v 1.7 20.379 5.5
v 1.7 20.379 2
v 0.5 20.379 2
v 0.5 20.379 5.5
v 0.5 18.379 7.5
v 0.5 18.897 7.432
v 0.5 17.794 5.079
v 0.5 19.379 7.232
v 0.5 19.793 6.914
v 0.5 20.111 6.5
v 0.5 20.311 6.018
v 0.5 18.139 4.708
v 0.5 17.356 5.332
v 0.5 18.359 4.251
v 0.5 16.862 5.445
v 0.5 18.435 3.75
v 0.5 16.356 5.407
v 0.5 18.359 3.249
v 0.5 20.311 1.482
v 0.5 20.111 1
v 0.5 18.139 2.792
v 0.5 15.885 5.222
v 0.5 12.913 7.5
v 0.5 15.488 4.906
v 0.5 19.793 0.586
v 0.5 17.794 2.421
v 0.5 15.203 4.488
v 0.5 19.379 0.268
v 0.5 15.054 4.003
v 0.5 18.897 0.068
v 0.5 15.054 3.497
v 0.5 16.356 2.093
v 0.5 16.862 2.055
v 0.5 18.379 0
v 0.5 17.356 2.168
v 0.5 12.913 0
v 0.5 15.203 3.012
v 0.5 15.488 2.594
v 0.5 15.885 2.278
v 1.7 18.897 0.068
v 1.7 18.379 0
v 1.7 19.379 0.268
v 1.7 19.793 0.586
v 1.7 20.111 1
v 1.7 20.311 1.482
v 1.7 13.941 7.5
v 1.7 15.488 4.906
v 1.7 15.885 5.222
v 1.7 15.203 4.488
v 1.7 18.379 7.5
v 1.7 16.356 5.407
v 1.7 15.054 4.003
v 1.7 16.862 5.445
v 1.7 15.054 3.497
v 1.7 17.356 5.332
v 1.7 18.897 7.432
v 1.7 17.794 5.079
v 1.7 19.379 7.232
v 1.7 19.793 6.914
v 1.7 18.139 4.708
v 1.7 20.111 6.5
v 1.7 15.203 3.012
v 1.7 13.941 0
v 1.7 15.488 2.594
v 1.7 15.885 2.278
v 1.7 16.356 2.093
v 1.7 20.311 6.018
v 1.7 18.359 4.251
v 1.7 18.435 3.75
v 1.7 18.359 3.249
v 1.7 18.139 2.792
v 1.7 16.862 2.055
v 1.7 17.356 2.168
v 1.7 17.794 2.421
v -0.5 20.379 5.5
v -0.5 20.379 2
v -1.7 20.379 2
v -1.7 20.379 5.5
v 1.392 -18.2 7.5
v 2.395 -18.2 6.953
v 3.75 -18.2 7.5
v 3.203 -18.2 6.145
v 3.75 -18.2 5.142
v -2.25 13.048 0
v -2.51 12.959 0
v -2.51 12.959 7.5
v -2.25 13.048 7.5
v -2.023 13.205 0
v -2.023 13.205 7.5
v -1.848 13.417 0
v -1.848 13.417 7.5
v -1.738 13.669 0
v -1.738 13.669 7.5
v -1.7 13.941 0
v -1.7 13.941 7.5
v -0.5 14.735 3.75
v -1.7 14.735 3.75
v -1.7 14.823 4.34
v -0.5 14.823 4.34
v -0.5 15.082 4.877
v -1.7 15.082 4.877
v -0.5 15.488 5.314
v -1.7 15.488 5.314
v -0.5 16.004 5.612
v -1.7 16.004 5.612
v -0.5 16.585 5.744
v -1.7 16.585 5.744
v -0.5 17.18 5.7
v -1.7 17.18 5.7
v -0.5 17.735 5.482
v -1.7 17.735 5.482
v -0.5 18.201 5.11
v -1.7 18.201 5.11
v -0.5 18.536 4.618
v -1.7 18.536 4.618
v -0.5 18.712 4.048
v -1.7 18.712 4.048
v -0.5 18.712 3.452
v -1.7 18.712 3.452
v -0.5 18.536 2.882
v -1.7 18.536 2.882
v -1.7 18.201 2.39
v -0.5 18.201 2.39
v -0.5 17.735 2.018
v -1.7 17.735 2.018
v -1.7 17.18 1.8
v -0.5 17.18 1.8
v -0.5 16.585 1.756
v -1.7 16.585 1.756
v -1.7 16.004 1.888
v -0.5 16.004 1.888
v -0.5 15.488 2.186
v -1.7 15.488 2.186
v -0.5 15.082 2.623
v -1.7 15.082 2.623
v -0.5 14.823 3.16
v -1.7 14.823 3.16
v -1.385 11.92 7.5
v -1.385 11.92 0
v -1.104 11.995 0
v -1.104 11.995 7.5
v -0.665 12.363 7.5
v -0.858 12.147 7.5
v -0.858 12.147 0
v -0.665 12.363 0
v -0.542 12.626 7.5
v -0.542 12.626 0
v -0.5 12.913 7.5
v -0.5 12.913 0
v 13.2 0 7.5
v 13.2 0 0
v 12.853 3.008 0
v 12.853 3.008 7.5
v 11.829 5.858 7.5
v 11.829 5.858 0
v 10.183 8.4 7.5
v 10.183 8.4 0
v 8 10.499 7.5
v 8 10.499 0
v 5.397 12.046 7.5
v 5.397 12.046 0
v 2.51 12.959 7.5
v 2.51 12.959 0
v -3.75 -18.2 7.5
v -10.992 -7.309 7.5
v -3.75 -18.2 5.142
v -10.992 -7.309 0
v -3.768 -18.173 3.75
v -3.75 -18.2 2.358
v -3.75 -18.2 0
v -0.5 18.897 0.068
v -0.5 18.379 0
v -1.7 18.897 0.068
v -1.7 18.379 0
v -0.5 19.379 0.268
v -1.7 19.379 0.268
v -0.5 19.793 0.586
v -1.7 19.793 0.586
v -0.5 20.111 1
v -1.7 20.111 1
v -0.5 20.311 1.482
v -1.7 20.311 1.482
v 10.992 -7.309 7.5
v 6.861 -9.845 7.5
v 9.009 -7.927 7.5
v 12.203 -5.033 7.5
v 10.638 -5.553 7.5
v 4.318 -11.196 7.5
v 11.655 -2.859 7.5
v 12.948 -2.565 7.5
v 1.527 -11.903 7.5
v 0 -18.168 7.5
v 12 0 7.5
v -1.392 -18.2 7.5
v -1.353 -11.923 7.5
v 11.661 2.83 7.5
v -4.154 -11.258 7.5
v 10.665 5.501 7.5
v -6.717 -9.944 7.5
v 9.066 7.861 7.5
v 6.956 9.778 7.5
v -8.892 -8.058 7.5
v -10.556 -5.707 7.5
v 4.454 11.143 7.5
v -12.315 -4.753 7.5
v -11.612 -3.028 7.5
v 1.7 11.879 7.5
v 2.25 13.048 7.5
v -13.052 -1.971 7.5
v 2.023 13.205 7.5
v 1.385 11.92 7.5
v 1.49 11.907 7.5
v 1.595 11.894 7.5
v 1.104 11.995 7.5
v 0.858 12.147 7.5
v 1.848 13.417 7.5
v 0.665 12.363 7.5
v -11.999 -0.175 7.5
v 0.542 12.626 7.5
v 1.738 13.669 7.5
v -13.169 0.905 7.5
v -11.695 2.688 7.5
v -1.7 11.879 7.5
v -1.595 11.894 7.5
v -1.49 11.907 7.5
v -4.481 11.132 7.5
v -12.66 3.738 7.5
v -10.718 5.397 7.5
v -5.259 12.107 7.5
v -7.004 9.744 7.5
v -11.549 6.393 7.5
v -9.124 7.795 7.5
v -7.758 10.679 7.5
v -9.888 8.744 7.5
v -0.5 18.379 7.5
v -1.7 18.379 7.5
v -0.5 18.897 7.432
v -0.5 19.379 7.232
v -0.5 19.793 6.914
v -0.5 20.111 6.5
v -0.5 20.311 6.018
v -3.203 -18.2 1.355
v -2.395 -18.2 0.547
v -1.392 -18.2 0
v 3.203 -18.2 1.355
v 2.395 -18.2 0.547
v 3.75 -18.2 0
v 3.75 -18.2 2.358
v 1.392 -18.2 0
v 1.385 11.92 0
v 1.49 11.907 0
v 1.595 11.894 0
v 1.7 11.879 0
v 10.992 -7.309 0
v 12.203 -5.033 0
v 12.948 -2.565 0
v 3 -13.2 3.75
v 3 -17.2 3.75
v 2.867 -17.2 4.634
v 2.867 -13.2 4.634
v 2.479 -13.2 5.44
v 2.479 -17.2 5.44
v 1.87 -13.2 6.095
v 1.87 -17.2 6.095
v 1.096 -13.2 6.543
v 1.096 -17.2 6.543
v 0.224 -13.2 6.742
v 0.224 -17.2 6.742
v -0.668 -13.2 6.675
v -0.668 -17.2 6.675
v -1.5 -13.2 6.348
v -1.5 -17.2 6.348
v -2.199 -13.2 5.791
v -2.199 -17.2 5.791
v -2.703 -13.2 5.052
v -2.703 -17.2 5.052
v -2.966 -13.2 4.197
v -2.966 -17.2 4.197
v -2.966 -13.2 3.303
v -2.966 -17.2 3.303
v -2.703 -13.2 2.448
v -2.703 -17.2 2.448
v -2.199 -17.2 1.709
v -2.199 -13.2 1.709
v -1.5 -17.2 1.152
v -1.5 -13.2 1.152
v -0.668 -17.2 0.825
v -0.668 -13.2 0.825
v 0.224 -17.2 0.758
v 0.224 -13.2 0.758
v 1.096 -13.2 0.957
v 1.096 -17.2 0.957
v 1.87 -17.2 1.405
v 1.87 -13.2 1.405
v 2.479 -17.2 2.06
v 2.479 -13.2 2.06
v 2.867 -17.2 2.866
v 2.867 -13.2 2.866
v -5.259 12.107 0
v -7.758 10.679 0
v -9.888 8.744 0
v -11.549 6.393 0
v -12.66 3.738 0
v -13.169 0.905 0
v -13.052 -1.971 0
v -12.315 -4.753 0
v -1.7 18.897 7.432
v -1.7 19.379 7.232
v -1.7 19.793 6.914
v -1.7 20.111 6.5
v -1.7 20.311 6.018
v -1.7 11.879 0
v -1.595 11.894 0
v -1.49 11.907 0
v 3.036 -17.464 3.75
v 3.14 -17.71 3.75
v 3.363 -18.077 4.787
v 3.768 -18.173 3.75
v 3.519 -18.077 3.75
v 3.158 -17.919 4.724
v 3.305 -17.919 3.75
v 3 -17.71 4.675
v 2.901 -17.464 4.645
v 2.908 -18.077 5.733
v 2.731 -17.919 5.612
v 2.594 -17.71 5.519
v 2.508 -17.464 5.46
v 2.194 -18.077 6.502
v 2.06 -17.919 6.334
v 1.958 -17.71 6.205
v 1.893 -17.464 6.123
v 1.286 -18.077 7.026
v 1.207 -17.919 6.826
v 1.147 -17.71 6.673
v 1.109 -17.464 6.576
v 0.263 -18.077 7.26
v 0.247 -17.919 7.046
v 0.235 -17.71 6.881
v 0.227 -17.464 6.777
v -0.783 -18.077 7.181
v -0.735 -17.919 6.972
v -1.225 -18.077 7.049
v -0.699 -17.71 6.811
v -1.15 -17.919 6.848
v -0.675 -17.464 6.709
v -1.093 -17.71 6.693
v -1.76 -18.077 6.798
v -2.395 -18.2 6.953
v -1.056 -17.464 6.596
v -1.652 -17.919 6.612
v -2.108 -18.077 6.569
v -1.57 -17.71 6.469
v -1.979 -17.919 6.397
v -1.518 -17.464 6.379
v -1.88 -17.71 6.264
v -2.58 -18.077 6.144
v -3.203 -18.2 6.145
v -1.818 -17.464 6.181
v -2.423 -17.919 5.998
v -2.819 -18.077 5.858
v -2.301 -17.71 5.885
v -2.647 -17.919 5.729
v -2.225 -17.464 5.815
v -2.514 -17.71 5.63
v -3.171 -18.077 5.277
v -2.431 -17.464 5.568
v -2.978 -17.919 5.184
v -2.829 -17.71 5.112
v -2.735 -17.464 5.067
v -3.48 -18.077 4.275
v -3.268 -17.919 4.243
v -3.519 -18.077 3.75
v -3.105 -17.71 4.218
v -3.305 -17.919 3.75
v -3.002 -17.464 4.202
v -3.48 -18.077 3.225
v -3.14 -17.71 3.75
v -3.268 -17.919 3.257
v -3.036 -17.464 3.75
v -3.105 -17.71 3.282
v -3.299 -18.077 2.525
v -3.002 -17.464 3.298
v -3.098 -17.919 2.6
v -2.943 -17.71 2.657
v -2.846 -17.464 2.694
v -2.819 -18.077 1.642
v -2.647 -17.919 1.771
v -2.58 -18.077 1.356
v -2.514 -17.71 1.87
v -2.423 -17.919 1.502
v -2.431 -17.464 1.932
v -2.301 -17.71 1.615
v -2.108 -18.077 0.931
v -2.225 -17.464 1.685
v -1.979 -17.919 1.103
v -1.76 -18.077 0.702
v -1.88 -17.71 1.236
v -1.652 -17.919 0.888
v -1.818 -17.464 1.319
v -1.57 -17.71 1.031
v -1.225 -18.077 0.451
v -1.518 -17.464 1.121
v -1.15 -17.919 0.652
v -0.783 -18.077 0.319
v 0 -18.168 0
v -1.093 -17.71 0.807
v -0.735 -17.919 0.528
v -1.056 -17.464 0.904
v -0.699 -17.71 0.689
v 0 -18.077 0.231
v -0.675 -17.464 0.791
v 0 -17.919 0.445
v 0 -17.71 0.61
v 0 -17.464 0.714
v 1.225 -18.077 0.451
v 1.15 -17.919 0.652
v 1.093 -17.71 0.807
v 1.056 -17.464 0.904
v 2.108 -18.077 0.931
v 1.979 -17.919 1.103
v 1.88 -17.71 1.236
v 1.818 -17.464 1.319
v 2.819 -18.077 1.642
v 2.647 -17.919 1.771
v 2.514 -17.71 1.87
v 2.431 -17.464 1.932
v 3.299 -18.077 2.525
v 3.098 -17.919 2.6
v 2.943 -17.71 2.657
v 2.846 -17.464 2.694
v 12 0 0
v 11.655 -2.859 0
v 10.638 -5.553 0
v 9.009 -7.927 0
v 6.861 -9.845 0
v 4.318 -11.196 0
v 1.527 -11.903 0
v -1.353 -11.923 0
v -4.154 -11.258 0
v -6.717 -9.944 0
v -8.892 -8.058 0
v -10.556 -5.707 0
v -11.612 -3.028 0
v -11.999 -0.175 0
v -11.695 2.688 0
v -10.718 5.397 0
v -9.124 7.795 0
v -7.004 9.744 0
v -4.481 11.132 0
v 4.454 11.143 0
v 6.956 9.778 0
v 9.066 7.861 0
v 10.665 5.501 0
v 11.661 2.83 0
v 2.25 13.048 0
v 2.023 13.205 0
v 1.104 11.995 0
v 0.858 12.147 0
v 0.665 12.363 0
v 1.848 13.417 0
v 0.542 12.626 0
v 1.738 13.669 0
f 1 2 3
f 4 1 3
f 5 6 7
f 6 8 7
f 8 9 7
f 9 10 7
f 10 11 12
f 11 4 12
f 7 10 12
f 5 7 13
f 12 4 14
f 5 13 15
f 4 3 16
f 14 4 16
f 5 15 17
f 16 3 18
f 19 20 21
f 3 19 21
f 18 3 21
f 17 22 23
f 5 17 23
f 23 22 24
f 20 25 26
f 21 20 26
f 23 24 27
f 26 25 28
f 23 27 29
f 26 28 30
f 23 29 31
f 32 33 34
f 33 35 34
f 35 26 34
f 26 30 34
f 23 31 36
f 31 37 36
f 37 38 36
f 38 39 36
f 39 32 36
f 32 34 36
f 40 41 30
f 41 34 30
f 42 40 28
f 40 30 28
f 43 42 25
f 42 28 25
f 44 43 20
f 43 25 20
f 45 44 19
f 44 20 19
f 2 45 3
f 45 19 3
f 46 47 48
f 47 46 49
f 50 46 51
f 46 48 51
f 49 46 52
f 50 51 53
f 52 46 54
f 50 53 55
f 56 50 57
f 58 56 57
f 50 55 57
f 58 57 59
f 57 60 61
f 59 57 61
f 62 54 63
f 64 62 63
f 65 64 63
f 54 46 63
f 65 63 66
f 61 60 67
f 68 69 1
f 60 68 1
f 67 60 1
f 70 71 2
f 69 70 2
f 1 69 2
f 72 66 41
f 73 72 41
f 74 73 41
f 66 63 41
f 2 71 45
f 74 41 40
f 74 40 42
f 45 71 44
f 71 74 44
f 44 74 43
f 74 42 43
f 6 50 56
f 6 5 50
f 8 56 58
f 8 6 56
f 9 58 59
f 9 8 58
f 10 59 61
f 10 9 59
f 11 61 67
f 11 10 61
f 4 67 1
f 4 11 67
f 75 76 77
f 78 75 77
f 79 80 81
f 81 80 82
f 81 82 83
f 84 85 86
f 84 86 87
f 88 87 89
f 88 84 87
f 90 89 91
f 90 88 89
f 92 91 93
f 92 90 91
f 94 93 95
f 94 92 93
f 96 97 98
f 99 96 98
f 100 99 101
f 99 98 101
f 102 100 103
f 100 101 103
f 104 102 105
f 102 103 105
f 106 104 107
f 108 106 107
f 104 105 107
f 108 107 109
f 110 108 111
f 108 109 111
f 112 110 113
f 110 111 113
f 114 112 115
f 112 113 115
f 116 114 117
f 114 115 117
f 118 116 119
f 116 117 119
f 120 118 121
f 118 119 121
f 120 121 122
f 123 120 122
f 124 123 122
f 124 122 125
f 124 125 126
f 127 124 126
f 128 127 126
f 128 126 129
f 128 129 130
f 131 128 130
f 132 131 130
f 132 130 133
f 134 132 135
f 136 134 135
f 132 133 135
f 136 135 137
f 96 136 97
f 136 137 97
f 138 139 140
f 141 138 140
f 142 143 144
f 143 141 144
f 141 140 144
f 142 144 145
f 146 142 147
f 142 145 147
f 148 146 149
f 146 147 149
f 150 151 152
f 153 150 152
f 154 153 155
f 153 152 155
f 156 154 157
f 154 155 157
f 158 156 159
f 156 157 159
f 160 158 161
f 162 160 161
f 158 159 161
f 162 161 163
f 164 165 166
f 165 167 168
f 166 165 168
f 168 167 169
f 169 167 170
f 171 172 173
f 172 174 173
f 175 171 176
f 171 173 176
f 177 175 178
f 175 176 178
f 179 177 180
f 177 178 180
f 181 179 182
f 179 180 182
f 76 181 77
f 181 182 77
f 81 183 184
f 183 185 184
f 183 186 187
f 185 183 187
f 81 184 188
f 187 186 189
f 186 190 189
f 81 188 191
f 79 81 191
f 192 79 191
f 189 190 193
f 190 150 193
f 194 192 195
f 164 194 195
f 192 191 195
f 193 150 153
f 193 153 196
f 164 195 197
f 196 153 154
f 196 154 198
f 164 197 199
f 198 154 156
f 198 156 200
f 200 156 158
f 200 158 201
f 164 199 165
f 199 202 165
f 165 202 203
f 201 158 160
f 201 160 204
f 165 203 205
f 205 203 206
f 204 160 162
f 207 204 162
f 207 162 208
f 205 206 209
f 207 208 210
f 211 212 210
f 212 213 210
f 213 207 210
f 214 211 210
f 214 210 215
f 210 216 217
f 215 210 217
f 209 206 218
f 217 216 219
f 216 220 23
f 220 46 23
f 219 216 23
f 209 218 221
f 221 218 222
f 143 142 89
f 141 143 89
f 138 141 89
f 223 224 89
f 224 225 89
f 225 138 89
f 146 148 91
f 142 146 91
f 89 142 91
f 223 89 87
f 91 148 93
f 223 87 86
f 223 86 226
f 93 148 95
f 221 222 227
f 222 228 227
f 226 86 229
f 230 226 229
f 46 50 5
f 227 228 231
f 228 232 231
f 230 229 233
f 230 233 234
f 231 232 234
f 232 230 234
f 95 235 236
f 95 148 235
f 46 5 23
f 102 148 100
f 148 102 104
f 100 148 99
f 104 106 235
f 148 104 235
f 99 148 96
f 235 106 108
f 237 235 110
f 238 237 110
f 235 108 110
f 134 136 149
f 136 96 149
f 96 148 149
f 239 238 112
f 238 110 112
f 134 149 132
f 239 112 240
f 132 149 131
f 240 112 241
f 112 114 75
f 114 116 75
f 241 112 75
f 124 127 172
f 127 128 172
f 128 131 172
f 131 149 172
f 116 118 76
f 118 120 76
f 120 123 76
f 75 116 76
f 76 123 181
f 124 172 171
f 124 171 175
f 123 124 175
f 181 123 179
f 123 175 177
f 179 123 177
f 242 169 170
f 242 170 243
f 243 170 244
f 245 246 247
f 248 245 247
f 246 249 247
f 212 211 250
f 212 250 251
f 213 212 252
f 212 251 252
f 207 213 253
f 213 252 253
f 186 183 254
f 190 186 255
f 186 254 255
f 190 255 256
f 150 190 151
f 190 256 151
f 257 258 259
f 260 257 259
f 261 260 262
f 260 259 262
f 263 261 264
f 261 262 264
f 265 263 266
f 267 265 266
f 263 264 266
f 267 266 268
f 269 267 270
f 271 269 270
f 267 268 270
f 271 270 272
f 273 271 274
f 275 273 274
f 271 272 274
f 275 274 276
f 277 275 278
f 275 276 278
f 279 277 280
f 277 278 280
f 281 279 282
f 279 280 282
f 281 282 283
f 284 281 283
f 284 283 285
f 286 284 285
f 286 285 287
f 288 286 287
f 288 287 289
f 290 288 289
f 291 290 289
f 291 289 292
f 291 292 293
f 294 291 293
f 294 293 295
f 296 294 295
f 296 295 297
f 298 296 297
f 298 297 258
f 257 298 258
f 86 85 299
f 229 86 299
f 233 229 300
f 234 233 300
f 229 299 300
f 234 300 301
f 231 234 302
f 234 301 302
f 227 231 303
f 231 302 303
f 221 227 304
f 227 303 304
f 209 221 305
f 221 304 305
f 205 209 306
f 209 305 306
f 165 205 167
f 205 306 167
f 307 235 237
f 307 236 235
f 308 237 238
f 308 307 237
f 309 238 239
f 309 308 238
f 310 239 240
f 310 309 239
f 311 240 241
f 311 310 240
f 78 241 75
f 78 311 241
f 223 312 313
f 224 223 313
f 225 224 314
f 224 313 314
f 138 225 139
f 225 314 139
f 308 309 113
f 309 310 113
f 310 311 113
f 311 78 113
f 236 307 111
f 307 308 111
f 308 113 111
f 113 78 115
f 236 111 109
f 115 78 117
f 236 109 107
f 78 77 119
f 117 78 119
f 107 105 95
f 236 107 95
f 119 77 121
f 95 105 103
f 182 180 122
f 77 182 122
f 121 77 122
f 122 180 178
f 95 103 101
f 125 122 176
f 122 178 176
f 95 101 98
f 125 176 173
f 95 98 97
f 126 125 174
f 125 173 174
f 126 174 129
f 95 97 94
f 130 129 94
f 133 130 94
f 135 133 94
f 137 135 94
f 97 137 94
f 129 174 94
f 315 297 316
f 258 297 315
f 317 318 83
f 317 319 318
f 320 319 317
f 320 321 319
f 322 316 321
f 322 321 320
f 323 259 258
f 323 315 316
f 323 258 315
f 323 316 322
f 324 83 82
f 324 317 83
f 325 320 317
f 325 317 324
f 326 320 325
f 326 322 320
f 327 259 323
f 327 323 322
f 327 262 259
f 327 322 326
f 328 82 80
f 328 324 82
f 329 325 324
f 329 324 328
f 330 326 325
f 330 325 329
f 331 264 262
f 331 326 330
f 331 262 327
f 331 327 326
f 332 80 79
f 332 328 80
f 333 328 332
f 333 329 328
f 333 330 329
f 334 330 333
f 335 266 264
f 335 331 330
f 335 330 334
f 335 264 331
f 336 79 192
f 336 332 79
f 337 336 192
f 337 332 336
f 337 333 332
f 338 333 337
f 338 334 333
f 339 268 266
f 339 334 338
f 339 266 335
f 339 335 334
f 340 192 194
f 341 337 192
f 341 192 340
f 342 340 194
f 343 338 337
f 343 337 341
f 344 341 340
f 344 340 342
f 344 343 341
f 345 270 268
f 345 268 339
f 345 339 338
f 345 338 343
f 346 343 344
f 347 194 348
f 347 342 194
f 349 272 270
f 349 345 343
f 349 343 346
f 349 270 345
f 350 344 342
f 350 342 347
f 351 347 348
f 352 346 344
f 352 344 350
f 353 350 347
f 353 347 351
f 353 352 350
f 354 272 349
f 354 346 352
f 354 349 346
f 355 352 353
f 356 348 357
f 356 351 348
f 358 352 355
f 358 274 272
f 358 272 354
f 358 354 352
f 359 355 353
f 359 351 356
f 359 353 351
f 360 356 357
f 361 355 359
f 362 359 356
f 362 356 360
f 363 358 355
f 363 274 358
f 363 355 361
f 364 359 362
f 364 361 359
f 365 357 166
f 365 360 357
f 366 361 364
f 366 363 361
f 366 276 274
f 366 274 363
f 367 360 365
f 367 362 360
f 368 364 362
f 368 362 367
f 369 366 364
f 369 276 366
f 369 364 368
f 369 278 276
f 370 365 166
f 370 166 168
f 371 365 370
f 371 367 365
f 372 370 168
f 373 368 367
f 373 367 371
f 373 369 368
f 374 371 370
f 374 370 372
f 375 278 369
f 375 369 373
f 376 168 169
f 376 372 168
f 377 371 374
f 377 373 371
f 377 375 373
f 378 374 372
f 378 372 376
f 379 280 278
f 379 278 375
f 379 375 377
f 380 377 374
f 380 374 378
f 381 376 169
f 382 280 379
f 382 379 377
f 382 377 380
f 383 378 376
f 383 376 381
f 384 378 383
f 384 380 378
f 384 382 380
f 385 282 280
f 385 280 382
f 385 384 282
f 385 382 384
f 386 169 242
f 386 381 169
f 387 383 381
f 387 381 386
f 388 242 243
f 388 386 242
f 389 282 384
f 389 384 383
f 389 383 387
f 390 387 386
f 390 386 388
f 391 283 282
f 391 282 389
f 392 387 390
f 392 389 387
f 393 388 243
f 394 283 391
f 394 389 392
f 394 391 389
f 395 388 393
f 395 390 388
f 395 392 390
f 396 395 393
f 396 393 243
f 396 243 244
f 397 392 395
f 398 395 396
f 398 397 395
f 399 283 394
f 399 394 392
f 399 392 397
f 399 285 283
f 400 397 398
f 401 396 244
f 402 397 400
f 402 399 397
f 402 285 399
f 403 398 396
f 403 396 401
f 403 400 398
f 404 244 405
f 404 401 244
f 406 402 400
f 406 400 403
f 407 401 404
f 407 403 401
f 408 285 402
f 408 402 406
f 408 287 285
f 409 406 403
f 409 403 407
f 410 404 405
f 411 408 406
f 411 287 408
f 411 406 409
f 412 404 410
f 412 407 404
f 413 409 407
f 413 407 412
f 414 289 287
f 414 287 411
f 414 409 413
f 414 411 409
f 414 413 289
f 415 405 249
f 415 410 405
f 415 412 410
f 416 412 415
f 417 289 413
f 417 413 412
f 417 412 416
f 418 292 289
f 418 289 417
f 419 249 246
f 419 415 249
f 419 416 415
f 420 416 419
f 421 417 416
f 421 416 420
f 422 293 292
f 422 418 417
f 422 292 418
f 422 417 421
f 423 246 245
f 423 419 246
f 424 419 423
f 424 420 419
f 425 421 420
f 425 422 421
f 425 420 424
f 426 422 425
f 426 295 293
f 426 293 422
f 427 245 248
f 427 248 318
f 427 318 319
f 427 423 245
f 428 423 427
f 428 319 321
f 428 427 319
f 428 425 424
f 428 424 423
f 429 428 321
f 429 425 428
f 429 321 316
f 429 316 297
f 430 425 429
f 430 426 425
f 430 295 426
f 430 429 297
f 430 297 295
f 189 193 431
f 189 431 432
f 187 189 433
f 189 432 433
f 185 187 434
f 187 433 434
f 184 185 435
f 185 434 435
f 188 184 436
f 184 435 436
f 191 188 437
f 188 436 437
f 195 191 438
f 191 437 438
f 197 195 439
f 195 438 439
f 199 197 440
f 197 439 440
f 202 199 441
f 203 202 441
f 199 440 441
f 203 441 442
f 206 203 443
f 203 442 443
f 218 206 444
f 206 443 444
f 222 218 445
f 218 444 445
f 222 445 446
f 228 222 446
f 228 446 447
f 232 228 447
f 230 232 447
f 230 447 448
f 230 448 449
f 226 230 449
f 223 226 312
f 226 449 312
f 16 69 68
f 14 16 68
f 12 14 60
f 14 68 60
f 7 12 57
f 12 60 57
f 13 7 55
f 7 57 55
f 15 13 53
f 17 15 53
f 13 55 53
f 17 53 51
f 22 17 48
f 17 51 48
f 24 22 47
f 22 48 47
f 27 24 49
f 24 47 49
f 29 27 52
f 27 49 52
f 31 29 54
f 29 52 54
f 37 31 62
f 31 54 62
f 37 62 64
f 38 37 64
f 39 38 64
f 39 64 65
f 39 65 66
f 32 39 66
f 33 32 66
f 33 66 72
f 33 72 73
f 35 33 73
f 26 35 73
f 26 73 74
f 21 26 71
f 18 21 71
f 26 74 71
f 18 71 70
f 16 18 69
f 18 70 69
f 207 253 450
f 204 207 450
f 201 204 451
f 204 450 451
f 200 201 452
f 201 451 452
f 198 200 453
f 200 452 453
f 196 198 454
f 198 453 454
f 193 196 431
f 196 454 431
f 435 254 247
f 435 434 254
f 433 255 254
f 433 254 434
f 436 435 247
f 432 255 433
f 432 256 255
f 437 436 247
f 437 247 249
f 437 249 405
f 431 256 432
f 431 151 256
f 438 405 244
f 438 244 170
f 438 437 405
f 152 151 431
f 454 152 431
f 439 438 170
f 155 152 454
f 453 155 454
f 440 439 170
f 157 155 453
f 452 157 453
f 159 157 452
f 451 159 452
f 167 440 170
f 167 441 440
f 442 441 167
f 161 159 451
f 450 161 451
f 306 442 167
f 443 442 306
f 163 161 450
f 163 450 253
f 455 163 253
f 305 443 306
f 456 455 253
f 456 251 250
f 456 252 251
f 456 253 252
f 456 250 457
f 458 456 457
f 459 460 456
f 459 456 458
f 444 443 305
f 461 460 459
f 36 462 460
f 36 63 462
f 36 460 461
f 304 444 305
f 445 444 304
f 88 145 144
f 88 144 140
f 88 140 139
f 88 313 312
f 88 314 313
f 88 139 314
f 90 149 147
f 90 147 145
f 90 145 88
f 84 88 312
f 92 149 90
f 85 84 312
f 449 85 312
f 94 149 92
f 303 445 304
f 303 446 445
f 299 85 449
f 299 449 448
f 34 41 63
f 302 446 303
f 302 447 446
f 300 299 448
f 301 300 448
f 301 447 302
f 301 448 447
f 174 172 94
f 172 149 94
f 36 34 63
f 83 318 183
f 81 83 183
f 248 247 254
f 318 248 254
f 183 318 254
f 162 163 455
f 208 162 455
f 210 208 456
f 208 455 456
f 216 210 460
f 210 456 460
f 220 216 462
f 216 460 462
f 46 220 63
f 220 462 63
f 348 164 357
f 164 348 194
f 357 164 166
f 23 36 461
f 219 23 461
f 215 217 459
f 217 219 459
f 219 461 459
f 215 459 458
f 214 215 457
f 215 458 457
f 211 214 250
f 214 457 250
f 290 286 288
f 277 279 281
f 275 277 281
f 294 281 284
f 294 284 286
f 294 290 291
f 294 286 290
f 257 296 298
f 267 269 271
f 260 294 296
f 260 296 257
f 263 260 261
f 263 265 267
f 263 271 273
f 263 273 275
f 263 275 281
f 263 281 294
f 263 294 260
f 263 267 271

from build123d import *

# Parameters (mm, degrees)
F1_DEPTH    = 7.5
F2_R        = 3
F3_DEPTH    = 5
F4_R        = 2
F5_DEPTH    = 1.2
F6_R        = 1.7
F7_DEPTH    = 1.2
F8_T1_DEPTH = 7.5
F8_T3_DEPTH = 12.1179638093
F9_R        = 2


# Not quite as in the source:
# - a fillet or chamfer that OpenCascade refuses, or shapes differently, is made with other operations: its cross-section is extruded or revolved along the edge and cut away or added


with BuildPart() as f1:
    # F0 (on Top) → F1 (new body)
    with BuildSketch(Plane.XY):
        with BuildLine():
            ThreePointArc((10.9918685576, -7.3088182167), (0, -13.1999999285), (-10.9918685576, -7.3088182167))
            Line((-10.9918685576, -7.3088182167), (-3.75, -18.1999999285))
            Line((-3.75, -18.1999999285), (3.75, -18.1999999285))
            Line((3.75, -18.1999999285), (10.9918685576, -7.3088182167))
        make_face()
        with BuildLine():
            ThreePointArc((1.7, 11.8789730196), (9.0664215653, 7.8612976028), (12, 0))
            ThreePointArc((12, 0), (-7.8612976028, -9.0664215653), (-1.7, 11.8789730196))
            Line((-1.7, 11.8789730196), (-1.7, 13.0900725022))
            ThreePointArc((-1.7, 13.0900725022), (-12.0124754947, 5.4717849557), (-10.9918685576, -7.3088182167))
            ThreePointArc((-10.9918685576, -7.3088182167), (0, -13.1999999285), (10.9918685576, -7.3088182167))
            ThreePointArc((10.9918685576, -7.3088182167), (12.6359143374, -3.8175472451), (13.1999999285, 0))
            ThreePointArc((13.1999999285, 0), (9.9166526104, 8.7120605552), (1.7, 13.0900725022))
            Line((1.7, 13.0900725022), (1.7, 11.8789730196))
        make_face()
        with BuildLine():
            ThreePointArc((0.5, 13.1905268322), (1.1011461157, 13.1539908523), (1.7, 13.0900725022))
            Line((1.7, 13.0900725022), (1.7, 20.3789730196))
            Line((1.7, 20.3789730196), (0.5, 20.3789730196))
            Line((0.5, 20.3789730196), (0.5, 13.1905268322))
        make_face()
        with BuildLine():
            Line((-1.7, 20.3789730196), (-1.7, 13.0900725022))
            ThreePointArc((-1.7, 13.0900725022), (-1.1011461157, 13.1539908523), (-0.5, 13.1905268322))
            Line((-0.5, 13.1905268322), (-0.5, 20.3789730196))
            Line((-0.5, 20.3789730196), (-1.7, 20.3789730196))
        make_face()
        with BuildLine():
            Line((-1.7, 13.0900725022), (-1.7, 11.8789730196))
            ThreePointArc((-1.7, 11.8789730196), (-1.1013893091, 11.9493490028), (-0.5, 11.9895788083))
            Line((-0.5, 11.9895788083), (-0.5, 13.1905268322))
            ThreePointArc((-0.5, 13.1905268322), (-1.1011461157, 13.1539908523), (-1.7, 13.0900725022))
        make_face()
        with BuildLine():
            ThreePointArc((0.5, 11.9895788083), (1.1013893091, 11.9493490028), (1.7, 11.8789730196))
            Line((1.7, 11.8789730196), (1.7, 13.0900725022))
            ThreePointArc((1.7, 13.0900725022), (1.1011461157, 13.1539908523), (0.5, 13.1905268322))
            Line((0.5, 13.1905268322), (0.5, 11.9895788083))
        make_face()
    extrude(amount=F1_DEPTH)

    # F2 (on face) → F3 (cut)
    with BuildSketch(Plane.XZ.offset(18.1999999285)):
        with Locations((0, 3.75)):
            Circle(F2_R)
    extrude(amount=-F3_DEPTH, mode=Mode.SUBTRACT)

    # F4 (on face) → F5 (cut, through all)
    with BuildSketch(Plane(origin=(-1.7, 0, 0), x_dir=(0, -1, 0), z_dir=(-1, 0, 0))):
        with Locations((-16.7345227609, 3.75)):
            Circle(F4_R)
    extrude(amount=-F5_DEPTH, mode=Mode.SUBTRACT)

    # F6 (on face) → F7 (cut, through all)
    with BuildSketch(Plane.YZ.offset(1.7)):
        with Locations((16.7345227609, 3.75)):
            Circle(F6_R)
    extrude(amount=-F7_DEPTH, mode=Mode.SUBTRACT)

    # F8: fillet of radius 1 on 5 edges, made by hand

    # F8_s2 → F8_t1 (join)
    with BuildSketch(Plane.XY):
        with BuildLine():
            ThreePointArc((-2.509859154, 12.9591899878), (-1.9285919219, 13.3046060392), (-1.7, 13.9409468103))
            Line((-1.7, 13.9409468103), (-1.7, 13.0900725022))
            ThreePointArc((-1.7, 13.0900725022), (-2.1059466, 13.0309242585), (-2.509859154, 12.9591899878))
        make_face()
        with BuildLine():
            ThreePointArc((2.509859154, 12.9591899878), (1.9285919219, 13.3046060392), (1.7, 13.9409468103))
            Line((1.7, 13.9409468103), (1.7, 13.0900725022))
            ThreePointArc((1.7, 13.0900725022), (2.1059466, 13.0309242585), (2.509859154, 12.9591899878))
        make_face()
    extrude(amount=F8_T1_DEPTH)

    # F8_s4 → F8_t3 (cut)
    with BuildSketch(Plane.XY.offset(-2.3089819047)):
        with BuildLine():
            ThreePointArc((-1.3846153846, 11.9198506801), (-0.7532120062, 12.2481093984), (-0.5, 12.9131715701))
            Line((-0.5, 12.9131715701), (-0.5, 11.9895788083))
            ThreePointArc((-0.5, 11.9895788083), (-0.9429524325, 11.9628943283), (-1.3846153846, 11.9198506801))
        make_face()
        with BuildLine():
            ThreePointArc((0.5, 12.9131715701), (0.7532120062, 12.2481093984), (1.3846153846, 11.9198506801))
            ThreePointArc((1.3846153846, 11.9198506801), (0.9429524325, 11.9628943283), (0.5, 11.9895788083))
            Line((0.5, 11.9895788083), (0.5, 12.9131715701))
        make_face()
    extrude(amount=F8_T3_DEPTH, mode=Mode.SUBTRACT)

    # F8_s5 → F8_t6 (revolve, cut)
    with BuildSketch(Plane.XY.offset(3.75)):
        with BuildLine():
            ThreePointArc((4, -18.1999999285), (3.2928932188, -17.9071067097), (3, -17.1999999285))
            Line((3, -17.1999999285), (3, -18.1999999285))
            Line((3, -18.1999999285), (4, -18.1999999285))
        make_face()
    revolve(axis=Axis((0, -18.1999999285, 3.75), (0, -1, 0)), mode=Mode.SUBTRACT)

    # F9
    f9_edges = [f1.edges().sort_by_distance(p)[0] for p in [
        (-1.1, 20.378973, 7.5),
        (1.1, 20.378973, 7.5),
        (1.1, 20.378973, 0),
        (-1.1, 20.378973, 0),
    ]]
    fillet(f9_edges, radius=F9_R)


solid = f1.part
